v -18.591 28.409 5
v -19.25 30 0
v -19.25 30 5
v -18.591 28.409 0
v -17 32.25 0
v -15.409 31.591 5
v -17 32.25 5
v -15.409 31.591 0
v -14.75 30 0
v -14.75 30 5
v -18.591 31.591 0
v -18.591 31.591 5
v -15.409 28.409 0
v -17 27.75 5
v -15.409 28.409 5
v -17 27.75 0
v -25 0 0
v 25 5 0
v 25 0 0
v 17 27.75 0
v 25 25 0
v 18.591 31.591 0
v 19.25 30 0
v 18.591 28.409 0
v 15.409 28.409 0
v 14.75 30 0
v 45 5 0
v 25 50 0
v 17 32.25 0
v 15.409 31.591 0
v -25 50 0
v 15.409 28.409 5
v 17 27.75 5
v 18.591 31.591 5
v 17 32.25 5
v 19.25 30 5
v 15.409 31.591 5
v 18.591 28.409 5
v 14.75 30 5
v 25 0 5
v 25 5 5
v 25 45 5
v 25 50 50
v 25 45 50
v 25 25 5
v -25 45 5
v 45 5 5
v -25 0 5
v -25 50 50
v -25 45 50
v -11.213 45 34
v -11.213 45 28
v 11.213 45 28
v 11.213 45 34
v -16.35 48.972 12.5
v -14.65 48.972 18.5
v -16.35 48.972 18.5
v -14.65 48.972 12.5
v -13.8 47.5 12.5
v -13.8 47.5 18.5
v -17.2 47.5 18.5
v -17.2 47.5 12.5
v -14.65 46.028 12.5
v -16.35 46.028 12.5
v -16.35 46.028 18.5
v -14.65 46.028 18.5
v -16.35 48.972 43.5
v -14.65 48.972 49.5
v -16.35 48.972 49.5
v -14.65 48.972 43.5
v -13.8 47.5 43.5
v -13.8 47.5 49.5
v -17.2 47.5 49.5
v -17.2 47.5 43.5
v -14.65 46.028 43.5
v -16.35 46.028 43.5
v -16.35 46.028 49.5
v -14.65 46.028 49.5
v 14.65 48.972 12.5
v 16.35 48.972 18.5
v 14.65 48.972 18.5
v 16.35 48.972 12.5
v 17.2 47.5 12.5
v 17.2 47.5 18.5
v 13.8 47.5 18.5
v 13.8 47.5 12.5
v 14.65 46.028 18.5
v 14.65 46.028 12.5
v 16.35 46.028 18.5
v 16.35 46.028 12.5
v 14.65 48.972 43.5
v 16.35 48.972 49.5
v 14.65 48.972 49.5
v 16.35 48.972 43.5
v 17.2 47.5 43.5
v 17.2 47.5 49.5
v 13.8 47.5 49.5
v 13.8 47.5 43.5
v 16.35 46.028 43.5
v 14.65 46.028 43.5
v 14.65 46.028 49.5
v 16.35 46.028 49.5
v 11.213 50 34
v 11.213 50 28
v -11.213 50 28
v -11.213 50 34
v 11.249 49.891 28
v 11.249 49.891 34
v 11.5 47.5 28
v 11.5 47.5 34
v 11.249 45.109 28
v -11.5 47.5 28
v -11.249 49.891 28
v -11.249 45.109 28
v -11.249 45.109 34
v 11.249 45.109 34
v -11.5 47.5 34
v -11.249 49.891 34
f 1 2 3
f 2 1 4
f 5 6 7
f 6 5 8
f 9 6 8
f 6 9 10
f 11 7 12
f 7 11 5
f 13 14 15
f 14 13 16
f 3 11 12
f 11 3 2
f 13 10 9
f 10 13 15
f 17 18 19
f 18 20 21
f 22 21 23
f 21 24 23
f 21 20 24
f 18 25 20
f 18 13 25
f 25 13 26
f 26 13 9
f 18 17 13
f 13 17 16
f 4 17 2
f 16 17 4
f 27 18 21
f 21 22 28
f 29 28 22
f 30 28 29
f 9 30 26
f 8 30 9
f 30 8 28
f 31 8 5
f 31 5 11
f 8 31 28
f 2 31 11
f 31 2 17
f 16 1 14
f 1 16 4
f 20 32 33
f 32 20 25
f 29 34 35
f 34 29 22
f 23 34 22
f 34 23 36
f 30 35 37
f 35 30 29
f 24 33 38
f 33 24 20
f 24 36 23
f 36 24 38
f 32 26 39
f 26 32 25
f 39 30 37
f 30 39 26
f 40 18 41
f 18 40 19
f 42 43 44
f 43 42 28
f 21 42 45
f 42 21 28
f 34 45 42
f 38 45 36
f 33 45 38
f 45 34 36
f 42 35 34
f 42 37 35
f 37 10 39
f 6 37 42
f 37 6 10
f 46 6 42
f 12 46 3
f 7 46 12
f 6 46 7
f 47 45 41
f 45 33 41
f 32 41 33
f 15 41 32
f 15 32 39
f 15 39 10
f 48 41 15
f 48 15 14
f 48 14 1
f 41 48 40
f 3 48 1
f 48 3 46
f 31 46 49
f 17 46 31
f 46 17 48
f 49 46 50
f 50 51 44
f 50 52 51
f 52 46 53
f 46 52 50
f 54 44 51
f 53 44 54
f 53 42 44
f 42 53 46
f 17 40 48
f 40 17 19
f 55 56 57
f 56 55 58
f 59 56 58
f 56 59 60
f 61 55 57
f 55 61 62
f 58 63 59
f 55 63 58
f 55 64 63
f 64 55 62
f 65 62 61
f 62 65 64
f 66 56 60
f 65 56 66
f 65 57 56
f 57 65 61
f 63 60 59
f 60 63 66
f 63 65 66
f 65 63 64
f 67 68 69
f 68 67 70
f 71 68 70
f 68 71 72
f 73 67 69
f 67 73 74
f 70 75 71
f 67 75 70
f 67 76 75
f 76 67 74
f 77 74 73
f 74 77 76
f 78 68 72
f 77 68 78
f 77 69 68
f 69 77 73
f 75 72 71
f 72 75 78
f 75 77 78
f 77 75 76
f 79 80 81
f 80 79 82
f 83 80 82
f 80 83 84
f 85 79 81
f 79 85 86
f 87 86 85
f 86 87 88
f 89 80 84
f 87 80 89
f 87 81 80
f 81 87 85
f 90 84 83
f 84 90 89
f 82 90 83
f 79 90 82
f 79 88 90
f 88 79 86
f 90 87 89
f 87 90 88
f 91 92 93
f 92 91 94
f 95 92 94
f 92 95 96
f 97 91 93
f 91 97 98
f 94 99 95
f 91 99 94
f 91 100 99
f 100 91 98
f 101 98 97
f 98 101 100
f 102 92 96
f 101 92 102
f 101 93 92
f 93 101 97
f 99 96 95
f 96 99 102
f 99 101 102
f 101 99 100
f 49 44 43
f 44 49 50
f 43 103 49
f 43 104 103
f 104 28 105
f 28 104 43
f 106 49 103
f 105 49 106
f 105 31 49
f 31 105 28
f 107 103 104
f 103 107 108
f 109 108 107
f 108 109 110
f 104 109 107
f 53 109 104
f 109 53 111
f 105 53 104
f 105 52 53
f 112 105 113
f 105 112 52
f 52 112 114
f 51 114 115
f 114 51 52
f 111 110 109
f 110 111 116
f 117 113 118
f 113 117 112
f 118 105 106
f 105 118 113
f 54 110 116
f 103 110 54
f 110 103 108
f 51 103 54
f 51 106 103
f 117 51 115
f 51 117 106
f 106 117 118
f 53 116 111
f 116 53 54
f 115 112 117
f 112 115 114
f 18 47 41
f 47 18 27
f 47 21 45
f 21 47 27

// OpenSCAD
// NEMA 17 Stepper Motor Mounting Bracket for Syringe Pump
// Units: millimetres

// --- Base Plate Dimensions ---
base_width = 50;       // X extent: -25 to 25
base_depth = 45;      // Y extent: 0 to 45
base_thickness = 5;    // Z extent: 0 to 5

// --- Base Plate Hole Locations ---
hole_m4_x = 17;        // X position of M4 holes (symmetric)
hole_m4_y = 30;        // Y position of M4 holes
hole_m4_dia = 4.5;     // Diameter for M4 threaded holes

// --- Vertical Motor Plate Dimensions ---
motor_plate_width = 50; // X extent: -25 to 25
motor_plate_height = 50; // Z extent: 0 to 50
motor_plate_thickness = 5; // Y extent: 0 to 5

// --- Motor Plate Features ---
motor_boss_dia = 23;    // Diameter of centring boss hole
motor_boss_x = 0;       // X center of boss hole
motor_boss_z = 28;      // Z center of boss hole

// M3 Screw Pattern
screw_pattern_size = 31; // Square pattern size for M3 holes
screw_dia = 3.4;        // Diameter for M3 holes
screw_offset = screw_pattern_size / 2; // Distance from center to hole

// --- Gusset Dimensions ---
gusset_thickness = 5;   // Thickness of gussets (X direction)
gusset_leg_y = 20;      // Length of leg along Y
gusset_leg_z = 20;      // Length of leg along Z
gusset_corner_y = 5;    // Y position of right-angle corner
gusset_corner_z = 5;    // Z position of right-angle corner

// --- Helper Variables ---
hole_extend = 1;        // Extra length for through-holes to ensure clean cuts

// --- Modules ---

module base_plate() {
    // Main base block: X -25 to 25, Y 0 to 45, Z 0 to 5
    difference() {
        // Translate to position the cube from -25 to 25 in X, 0 to 45 in Y
        translate([-25, 0, 0])
            cube([base_width, base_depth, base_thickness], center = false);
        
        // Two M4 holes
        for (i = [-1, 1]) {
            translate([i * hole_m4_x, hole_m4_y, 0])
                cylinder(d = hole_m4_dia, h = base_thickness + hole_extend, center = false);
        }
    }
}

module motor_plate() {
    // Main vertical block: X -25 to 25, Y 0 to 5, Z 0 to 50
    // Placed on top of base at Y=45
    difference() {
        // Translate to position the cube from -25 to 25 in X, 45 to 50 in Y
        translate([-25, 45, 0])
            cube([motor_plate_width, motor_plate_thickness, motor_plate_height], center = false);
        
        // Centering boss hole (23mm)
        // Center at X=0, Z=28. Y is centered in the plate thickness (2.5)
        translate([motor_boss_x, 45 + motor_plate_thickness/2, motor_boss_z])
            cylinder(d = motor_boss_dia, h = motor_plate_thickness + hole_extend, center = false);
        
        // Four M3 screw holes on 31mm square pattern
        // Pattern centered at X=0, Z=28.
        for (i = [-1, 1]) {
            for (j = [-1, 1]) {
                translate([i * screw_offset, 45 + motor_plate_thickness/2, motor_boss_z + j * screw_offset])
                    cylinder(d = screw_dia, h = motor_plate_thickness + hole_extend, center = false);
            }
        }
    }
}

module gusset(side) {
    // side = -1 for left, 1 for right
    // Right triangle in YZ plane.
    // Legs: 20mm along +Y, 20mm along +Z.
    // Right-angle corner at Y=5, Z=5.
    // Vertices: (5,5), (25,5), (5,25).
    
    // Extrude along X from side*25 to side*20 (thickness 5)
    // Wait, spec says "flush with left and right edges (x = -25 to -20 and x = 20 to 25)".
    // So left gusset is X -25 to -20. Right gusset is X 20 to 25.
    
    if (side == -1) {
        translate([-25, 0, 0])
            linear_extrude(height = 5)
                polygon([
                    [5, 5],
                    [25, 5],
                    [5, 25]
                ]);
    } else {
        translate([20, 0, 0])
            linear_extrude(height = 5)
                polygon([
                    [5, 5],
                    [25, 5],
                    [5, 25]
                ]);
    }
}

// --- Main Assembly ---

union() {
    // Base plate
    base_plate();
    
    // Vertical motor plate
    motor_plate();
    
    // Gussets
    gusset(-1);
    gusset(1);
}
